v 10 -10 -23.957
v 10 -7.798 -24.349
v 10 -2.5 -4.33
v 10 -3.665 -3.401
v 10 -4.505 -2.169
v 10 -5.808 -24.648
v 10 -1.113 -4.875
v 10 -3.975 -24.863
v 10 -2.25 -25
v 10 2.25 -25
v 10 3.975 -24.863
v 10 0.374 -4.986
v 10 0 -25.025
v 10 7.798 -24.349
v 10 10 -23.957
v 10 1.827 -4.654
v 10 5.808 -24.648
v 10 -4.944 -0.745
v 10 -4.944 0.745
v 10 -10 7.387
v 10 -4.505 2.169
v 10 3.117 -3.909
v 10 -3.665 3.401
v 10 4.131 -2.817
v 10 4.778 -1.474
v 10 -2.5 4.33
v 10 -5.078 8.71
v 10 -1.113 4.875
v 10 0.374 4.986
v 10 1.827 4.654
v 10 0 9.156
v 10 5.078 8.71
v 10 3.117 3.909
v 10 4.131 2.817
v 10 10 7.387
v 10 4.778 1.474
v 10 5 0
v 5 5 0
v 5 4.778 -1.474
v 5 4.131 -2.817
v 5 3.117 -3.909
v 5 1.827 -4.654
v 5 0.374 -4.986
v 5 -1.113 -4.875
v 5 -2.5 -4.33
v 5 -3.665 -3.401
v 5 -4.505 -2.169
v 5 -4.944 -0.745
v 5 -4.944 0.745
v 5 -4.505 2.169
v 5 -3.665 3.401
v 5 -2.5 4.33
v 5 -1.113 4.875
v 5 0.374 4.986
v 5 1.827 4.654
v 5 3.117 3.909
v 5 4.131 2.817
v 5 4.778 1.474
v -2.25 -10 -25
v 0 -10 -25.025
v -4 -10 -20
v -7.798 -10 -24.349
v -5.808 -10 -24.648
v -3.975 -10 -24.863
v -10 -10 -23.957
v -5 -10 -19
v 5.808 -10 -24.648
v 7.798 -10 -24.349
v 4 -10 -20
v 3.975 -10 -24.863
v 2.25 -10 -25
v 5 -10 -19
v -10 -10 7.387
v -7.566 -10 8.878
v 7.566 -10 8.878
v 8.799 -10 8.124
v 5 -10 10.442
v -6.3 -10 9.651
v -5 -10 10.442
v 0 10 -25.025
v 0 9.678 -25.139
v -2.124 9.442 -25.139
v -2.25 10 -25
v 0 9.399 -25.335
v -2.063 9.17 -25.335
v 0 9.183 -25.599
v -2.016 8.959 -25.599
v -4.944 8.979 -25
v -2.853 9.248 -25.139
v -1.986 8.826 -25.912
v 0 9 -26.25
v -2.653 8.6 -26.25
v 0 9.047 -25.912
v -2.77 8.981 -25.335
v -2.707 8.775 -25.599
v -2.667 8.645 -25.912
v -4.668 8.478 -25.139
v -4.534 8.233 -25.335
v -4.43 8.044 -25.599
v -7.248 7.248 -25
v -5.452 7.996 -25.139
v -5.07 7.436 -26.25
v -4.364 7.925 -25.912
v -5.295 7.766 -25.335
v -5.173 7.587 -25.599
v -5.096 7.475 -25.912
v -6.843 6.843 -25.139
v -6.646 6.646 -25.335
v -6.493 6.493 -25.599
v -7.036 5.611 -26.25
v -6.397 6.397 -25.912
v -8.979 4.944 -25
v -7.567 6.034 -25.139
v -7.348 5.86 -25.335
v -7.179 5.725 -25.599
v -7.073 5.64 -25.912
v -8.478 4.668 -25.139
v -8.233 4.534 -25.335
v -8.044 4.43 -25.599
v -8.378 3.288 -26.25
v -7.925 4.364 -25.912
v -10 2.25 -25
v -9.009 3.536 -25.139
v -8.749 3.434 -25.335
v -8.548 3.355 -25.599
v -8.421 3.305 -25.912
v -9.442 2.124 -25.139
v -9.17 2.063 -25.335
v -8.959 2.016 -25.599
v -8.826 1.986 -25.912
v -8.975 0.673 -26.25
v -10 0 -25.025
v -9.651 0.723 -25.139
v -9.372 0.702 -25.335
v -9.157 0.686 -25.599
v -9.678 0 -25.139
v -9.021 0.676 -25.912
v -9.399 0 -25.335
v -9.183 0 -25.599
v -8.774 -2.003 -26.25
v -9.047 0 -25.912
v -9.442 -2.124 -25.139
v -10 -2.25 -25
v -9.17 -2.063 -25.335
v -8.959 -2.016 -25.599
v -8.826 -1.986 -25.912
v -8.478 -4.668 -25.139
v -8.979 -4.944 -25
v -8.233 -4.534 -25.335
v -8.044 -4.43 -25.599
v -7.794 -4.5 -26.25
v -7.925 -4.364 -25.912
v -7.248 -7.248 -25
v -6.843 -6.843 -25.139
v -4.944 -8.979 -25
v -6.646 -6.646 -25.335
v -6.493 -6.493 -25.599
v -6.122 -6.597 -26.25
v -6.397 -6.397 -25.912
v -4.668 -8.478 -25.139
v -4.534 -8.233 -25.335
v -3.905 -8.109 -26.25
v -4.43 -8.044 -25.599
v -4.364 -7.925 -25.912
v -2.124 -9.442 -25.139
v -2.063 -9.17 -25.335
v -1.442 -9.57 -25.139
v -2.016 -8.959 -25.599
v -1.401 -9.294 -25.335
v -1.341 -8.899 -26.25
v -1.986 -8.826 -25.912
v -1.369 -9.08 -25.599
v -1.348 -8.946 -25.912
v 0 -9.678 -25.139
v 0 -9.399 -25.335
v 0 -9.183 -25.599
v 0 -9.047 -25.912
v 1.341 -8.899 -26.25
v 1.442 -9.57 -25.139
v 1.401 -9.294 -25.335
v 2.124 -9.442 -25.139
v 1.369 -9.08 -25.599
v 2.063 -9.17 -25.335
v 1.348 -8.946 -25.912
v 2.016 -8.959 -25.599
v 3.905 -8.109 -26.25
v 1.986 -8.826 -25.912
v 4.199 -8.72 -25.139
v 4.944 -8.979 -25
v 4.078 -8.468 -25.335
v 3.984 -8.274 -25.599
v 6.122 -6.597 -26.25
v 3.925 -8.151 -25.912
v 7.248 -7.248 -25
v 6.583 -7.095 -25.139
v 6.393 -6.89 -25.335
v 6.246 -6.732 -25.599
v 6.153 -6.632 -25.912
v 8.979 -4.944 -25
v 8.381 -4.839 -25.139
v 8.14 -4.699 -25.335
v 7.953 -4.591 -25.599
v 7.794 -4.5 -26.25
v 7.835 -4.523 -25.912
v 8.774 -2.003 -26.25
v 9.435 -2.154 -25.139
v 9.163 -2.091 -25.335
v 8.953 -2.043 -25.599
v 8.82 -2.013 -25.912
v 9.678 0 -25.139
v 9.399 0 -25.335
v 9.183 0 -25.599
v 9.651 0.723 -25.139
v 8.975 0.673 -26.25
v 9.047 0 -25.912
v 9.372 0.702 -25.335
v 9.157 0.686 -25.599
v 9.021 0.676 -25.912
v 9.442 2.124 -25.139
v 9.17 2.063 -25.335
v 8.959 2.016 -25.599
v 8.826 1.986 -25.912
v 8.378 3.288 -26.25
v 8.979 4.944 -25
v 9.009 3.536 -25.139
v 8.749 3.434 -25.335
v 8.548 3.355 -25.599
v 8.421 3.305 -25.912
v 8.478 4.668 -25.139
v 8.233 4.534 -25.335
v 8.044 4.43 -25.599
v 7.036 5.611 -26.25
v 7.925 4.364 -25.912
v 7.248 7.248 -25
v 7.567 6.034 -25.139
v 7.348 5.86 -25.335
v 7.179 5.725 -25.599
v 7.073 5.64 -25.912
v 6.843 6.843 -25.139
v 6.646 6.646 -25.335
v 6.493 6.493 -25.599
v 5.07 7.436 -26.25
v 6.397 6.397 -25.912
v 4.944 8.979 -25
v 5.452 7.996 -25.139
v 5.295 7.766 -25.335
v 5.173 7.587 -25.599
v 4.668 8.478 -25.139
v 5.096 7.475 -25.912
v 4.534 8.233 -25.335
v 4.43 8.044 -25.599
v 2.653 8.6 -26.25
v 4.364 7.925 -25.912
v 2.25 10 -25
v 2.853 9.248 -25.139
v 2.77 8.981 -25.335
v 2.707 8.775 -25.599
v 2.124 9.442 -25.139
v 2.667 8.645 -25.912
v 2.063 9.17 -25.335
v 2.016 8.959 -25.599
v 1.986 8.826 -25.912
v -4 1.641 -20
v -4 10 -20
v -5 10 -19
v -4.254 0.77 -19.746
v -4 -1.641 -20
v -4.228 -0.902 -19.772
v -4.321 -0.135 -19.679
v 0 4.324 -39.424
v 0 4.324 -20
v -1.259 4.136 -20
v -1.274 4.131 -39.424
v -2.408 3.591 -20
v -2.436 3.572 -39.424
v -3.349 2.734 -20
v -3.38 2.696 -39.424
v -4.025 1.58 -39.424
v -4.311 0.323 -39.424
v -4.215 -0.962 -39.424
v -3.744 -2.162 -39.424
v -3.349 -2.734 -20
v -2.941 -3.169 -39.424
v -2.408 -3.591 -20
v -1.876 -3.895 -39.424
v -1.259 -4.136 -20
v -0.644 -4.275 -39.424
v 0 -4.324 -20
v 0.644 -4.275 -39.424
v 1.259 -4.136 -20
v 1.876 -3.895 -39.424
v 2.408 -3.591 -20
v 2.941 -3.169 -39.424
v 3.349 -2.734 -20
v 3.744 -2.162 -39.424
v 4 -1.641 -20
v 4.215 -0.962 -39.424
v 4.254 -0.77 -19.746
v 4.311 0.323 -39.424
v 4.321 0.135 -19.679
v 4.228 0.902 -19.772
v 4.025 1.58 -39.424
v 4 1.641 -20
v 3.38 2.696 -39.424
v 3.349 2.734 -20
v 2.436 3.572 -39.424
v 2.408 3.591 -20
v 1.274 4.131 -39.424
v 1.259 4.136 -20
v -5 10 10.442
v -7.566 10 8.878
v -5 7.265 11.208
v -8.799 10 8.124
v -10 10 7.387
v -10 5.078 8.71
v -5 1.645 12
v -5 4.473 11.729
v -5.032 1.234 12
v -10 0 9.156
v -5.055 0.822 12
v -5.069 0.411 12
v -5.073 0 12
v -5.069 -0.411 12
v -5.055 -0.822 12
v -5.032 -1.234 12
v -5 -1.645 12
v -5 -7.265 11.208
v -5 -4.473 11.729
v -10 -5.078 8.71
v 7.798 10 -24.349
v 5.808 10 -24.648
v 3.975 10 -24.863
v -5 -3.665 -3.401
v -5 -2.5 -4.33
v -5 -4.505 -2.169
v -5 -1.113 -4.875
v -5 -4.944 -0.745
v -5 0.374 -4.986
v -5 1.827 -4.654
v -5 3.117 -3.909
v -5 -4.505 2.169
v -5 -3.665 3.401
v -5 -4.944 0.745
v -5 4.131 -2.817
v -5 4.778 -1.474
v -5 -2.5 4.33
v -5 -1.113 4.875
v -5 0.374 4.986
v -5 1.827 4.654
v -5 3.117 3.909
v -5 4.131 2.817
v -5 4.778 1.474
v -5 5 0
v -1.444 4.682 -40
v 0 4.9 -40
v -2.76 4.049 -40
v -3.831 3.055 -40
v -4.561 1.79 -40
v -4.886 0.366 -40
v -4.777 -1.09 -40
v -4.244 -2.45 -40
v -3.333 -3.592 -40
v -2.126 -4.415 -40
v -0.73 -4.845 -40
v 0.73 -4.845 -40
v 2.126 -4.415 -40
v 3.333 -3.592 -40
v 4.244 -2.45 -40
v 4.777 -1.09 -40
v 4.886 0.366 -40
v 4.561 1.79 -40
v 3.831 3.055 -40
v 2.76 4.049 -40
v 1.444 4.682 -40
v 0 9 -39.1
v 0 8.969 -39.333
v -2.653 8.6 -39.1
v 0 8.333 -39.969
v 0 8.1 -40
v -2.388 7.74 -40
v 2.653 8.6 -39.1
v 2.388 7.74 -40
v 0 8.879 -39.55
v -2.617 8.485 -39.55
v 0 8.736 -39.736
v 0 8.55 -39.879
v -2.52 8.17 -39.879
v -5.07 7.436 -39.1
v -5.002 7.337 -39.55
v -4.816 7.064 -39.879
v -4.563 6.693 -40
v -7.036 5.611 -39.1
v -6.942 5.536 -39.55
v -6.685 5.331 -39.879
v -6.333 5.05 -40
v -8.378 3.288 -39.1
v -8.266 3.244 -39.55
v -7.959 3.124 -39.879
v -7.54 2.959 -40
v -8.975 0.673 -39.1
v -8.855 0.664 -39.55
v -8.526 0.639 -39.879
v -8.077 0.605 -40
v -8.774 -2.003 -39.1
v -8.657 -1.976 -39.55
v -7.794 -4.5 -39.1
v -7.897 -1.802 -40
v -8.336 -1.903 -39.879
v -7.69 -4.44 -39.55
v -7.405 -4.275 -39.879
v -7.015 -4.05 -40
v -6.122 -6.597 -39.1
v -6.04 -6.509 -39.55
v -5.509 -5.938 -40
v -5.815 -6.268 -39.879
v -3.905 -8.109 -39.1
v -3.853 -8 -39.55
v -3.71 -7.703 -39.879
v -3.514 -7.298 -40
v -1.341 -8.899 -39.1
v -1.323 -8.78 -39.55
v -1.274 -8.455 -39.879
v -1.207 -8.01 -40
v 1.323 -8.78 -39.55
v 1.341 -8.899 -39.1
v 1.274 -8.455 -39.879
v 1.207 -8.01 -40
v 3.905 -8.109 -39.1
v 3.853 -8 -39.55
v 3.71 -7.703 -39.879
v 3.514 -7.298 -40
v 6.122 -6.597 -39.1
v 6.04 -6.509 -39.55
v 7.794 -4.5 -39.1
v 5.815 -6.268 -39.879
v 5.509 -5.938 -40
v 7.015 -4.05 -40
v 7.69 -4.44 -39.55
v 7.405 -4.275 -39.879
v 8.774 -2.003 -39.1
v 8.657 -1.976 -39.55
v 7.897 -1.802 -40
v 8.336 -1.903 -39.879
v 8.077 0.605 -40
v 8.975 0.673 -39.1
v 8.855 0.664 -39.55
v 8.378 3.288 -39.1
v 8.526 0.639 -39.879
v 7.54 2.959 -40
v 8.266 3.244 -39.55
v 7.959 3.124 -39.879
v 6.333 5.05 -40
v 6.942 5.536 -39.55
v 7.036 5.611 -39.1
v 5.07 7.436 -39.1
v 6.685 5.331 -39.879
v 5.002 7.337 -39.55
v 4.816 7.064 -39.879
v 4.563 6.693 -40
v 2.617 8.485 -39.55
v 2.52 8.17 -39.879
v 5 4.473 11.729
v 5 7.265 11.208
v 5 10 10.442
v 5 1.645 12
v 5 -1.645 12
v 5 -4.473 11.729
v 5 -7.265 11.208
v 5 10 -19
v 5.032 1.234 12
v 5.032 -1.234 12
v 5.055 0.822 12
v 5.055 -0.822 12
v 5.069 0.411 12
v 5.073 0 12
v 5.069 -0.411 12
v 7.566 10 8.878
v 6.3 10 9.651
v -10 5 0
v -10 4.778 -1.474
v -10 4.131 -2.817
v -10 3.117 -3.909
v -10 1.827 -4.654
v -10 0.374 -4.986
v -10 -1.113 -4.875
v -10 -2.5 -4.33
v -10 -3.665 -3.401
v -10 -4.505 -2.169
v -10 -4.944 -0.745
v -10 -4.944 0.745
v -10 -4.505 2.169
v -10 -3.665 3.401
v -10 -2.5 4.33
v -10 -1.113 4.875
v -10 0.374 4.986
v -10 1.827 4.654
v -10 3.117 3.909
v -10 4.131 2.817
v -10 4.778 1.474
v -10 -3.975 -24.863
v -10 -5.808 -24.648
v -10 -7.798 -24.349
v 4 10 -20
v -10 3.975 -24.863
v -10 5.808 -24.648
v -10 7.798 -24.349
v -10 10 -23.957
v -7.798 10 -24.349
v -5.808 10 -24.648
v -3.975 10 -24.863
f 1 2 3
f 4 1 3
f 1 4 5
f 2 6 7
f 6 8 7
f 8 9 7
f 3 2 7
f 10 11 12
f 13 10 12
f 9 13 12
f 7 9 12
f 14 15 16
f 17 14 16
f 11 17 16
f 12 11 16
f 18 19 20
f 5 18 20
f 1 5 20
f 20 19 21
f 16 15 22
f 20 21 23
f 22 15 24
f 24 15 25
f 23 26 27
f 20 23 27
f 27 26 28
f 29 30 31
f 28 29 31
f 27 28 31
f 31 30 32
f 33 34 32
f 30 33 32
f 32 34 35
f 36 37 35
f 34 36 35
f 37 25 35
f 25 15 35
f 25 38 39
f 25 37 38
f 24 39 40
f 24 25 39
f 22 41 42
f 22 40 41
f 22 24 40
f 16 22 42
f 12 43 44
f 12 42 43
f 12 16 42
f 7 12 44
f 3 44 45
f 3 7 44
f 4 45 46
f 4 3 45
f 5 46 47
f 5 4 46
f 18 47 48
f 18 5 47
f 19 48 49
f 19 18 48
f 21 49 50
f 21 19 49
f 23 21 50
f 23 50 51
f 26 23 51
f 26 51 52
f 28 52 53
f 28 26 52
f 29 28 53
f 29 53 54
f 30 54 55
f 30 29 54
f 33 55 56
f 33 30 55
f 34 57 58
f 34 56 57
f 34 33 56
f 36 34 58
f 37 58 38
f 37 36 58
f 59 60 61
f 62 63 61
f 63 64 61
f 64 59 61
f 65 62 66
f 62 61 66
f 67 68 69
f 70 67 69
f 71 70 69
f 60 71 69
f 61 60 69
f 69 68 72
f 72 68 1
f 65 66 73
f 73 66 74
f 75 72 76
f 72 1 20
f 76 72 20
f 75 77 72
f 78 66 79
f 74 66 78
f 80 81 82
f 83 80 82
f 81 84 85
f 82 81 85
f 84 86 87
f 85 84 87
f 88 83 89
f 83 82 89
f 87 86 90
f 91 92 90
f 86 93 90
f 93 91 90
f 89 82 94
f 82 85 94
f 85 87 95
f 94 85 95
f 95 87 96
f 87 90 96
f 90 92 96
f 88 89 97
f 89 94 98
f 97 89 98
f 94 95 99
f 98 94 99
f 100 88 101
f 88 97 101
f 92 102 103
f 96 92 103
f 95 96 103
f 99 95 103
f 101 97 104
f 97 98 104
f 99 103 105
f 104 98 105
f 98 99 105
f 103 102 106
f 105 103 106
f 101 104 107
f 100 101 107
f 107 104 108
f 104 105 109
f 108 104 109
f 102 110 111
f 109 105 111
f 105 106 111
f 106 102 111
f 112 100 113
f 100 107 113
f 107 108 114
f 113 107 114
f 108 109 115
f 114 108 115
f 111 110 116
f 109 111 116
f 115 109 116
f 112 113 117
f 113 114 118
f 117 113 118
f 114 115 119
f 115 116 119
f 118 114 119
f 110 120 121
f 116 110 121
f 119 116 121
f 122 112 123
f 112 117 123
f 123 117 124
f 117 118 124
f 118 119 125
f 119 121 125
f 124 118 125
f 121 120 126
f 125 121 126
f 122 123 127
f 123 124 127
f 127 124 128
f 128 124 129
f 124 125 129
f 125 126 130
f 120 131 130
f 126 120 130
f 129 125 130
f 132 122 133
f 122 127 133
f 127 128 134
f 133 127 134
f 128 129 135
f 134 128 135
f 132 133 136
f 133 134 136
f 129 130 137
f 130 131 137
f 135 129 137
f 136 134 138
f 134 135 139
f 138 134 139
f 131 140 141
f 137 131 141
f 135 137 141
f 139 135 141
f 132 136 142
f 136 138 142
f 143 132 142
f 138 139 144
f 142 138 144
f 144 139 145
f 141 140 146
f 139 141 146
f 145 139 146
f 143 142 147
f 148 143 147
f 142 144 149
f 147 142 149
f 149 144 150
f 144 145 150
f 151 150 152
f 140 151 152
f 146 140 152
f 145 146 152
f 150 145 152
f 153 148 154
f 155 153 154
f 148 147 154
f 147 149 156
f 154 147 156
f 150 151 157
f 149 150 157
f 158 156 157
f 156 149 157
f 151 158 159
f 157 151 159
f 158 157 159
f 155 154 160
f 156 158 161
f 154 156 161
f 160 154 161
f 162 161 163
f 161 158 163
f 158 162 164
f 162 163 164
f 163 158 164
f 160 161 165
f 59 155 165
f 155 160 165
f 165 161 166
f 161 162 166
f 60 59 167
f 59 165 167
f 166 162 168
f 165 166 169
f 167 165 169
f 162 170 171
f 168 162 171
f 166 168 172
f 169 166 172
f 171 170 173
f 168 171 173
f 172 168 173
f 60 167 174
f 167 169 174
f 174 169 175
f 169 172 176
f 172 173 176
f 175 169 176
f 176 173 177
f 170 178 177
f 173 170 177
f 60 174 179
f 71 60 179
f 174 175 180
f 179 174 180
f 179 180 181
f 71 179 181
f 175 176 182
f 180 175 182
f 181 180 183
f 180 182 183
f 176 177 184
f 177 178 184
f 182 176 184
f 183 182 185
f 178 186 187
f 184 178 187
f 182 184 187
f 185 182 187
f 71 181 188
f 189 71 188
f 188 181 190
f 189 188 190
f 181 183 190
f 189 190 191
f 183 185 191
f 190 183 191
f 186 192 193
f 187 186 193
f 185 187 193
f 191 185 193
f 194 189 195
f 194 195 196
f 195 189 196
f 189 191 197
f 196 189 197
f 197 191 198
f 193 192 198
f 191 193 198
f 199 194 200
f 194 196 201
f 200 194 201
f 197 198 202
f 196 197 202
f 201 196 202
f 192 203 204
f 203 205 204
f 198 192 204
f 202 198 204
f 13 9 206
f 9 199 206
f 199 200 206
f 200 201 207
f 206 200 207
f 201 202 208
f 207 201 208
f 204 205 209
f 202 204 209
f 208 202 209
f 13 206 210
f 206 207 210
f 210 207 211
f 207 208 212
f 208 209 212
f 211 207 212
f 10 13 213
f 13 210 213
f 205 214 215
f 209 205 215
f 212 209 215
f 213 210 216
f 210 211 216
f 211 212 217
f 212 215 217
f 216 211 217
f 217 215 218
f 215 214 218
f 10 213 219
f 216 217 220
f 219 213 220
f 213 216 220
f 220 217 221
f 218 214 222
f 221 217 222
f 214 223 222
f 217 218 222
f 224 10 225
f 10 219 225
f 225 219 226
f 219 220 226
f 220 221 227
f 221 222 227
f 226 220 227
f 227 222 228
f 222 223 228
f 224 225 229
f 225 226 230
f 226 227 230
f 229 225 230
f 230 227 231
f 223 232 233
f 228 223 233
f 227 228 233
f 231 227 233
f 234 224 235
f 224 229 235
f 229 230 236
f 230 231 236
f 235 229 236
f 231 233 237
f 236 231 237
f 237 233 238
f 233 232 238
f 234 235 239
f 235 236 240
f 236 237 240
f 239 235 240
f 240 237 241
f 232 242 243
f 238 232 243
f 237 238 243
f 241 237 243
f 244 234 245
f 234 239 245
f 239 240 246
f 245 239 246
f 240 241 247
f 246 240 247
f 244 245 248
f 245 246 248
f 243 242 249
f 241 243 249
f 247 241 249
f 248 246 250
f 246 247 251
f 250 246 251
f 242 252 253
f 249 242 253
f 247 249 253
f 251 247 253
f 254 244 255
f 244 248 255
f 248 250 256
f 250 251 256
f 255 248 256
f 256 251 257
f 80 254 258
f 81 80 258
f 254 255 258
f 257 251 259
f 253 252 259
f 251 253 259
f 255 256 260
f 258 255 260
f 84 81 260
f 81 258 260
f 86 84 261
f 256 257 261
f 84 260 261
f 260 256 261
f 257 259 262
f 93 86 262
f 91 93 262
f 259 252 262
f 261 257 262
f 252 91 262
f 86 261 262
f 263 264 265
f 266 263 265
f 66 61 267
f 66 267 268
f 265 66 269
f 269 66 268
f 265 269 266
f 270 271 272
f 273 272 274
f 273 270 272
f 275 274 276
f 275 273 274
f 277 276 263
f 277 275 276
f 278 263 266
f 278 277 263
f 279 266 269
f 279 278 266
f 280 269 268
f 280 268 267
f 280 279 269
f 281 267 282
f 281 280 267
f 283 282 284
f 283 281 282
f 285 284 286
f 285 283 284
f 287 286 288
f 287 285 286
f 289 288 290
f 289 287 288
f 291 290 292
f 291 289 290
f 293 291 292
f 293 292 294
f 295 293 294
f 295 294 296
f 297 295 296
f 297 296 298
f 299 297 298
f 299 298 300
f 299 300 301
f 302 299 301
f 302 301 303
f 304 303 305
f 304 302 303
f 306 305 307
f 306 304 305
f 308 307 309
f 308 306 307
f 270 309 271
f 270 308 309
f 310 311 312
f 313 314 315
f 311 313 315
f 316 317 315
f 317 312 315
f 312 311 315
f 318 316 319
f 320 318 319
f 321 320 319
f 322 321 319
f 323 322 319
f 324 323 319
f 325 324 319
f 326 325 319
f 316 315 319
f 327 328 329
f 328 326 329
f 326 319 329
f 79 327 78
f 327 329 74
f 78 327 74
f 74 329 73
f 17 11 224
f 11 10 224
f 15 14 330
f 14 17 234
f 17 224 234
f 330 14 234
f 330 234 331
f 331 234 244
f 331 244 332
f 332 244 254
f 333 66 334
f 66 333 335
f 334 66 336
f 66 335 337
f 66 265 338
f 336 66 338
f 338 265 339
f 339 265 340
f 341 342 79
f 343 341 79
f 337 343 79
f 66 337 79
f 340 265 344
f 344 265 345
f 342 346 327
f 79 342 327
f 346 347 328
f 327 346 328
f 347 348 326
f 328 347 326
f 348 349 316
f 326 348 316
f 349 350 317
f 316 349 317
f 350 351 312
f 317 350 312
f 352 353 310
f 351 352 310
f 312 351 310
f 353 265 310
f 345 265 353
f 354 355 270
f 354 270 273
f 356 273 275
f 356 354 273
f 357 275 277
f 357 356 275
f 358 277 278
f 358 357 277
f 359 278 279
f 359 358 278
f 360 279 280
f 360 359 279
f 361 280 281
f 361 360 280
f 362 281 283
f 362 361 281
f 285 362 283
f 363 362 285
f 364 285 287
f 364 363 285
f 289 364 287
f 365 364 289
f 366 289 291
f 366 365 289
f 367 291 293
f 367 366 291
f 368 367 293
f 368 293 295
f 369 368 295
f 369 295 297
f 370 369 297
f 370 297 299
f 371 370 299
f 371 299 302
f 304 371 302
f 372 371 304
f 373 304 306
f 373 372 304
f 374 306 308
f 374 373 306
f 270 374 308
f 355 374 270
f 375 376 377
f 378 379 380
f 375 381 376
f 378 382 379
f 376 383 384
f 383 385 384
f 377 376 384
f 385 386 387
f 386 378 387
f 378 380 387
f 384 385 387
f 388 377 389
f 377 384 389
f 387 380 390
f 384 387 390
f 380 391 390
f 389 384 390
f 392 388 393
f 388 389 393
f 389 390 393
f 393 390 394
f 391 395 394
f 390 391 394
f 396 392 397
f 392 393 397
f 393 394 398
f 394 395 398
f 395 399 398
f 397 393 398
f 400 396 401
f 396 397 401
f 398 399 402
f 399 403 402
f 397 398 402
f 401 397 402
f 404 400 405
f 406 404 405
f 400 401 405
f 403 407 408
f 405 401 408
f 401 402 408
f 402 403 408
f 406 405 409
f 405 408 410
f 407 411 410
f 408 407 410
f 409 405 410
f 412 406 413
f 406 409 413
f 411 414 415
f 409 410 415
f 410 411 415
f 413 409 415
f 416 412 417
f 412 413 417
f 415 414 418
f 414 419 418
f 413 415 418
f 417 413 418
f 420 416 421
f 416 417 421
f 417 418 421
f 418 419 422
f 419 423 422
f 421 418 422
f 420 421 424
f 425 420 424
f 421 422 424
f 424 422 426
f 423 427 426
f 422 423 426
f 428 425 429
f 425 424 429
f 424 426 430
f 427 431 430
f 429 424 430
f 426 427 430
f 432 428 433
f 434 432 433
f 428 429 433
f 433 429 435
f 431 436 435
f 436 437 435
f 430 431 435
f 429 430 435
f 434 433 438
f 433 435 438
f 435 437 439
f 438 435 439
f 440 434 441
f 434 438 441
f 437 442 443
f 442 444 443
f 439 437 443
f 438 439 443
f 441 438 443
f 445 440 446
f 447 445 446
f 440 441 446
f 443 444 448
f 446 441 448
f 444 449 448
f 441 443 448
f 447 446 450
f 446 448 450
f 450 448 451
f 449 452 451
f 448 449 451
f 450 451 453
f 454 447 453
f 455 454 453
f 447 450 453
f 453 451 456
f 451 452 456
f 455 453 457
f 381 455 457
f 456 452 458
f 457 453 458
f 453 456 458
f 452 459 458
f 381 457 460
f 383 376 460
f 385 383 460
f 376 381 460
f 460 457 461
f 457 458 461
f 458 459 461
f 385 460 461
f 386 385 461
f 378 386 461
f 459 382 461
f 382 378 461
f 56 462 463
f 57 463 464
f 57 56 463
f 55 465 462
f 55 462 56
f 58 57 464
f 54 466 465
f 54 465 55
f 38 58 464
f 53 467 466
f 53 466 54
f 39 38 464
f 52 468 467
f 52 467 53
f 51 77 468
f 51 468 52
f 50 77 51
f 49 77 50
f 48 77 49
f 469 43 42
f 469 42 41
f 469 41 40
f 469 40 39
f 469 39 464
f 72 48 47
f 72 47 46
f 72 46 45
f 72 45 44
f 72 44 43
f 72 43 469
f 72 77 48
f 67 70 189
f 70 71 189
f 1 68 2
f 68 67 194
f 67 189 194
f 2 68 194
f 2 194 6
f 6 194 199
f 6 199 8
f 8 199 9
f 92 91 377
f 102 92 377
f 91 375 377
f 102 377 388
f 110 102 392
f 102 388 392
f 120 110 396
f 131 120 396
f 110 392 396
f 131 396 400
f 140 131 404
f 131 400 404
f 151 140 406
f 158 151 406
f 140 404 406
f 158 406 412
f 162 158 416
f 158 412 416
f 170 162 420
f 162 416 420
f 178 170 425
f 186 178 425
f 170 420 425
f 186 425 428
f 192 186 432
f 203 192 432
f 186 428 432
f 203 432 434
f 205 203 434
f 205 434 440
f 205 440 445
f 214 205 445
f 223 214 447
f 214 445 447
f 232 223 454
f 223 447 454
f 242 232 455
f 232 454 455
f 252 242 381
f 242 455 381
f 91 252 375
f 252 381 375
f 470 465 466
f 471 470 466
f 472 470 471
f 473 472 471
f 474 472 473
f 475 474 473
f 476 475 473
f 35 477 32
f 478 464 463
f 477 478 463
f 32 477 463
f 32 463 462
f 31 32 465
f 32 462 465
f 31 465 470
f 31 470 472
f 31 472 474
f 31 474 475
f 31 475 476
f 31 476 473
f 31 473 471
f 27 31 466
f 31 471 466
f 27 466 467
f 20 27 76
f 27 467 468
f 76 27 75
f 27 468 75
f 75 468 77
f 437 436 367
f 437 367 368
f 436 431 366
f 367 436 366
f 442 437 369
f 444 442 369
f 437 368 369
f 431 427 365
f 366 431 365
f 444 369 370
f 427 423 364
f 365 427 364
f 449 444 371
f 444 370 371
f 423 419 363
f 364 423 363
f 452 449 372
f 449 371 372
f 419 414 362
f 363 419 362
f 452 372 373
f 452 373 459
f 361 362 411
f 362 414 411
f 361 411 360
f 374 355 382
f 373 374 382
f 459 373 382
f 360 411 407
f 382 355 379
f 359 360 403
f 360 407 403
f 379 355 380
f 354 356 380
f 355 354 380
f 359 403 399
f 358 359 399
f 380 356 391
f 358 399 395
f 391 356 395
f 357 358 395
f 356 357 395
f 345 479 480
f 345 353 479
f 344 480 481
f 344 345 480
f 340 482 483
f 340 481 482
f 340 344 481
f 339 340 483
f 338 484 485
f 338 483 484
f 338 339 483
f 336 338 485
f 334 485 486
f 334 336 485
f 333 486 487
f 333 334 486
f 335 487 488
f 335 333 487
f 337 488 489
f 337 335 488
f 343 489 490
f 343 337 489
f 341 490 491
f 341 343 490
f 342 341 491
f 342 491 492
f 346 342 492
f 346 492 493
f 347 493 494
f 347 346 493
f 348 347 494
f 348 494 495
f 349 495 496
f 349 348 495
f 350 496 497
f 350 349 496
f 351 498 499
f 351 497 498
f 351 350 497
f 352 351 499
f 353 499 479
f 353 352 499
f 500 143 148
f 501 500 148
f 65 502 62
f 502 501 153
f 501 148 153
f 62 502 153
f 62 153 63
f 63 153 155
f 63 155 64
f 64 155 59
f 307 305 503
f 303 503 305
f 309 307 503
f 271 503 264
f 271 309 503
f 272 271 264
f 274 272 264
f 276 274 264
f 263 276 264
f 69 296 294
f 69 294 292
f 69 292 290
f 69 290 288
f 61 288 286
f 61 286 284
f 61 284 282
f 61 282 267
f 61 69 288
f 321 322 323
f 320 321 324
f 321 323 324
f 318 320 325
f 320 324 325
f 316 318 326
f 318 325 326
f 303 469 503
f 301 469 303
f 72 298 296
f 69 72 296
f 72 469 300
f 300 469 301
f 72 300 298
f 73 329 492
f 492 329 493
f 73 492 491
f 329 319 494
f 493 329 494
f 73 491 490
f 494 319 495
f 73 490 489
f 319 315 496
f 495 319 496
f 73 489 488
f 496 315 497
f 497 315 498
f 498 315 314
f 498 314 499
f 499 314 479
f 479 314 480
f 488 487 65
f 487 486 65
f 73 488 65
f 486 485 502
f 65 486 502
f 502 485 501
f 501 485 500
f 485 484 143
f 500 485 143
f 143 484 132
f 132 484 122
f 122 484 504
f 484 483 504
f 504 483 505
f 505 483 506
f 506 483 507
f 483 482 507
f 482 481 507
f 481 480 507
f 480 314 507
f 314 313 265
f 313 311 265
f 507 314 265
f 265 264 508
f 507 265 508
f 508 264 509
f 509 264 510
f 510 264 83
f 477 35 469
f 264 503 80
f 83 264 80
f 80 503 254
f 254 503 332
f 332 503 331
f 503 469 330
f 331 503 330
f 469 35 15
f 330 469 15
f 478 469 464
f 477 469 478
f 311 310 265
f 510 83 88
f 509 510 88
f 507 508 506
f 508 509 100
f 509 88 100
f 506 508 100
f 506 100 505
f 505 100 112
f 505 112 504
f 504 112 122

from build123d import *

# Parameters (mm, degrees)
CUT_EXTRUDE1_DEPTH           = 21
CUT_EXTRUDE1_DEPTH_BACK      = 21
CUT_EXTRUDE2_DEPTH           = 21
CUT_EXTRUDE2_DEPTH_BACK      = 21
CUT_EXTRUDE3_DEPTH           = 21
CUT_EXTRUDE3_DEPTH_BACK      = 21
SKETCH5_W                    = 26
SKETCH5_H                    = 5
CUT_REVOLVE3_ANGLE           = 90
CUT_REVOLVE3_OTHER_WAY_ANGLE = 90


with BuildPart() as part:
    # Sketch1 → Revolve1 (revolve)
    with BuildSketch(Plane(origin=(0, 0, 0), x_dir=(0, 0, -1), z_dir=(1, 0, 0))):
        with BuildLine():
            Line((-12, 0), (-12, 20))
            Line((-12, 20), (22.387495374, 20))
            Line((22.387495374, 20), (25, 10.25))
            ThreePointArc((25, 10.25), (25.366116524, 9.366116524), (26.25, 9))
            Line((26.25, 9), (39.1, 9))
            ThreePointArc((39.1, 9), (39.736396103, 8.736396103), (40, 8.1))
            Line((40, 8.1), (40, 0))
            Line((40, 0), (-12, 0))
        make_face()
    revolve(axis=Axis((0, 0, -40), (0, 0, 1)))

    # Sketch2 → Cut-Extrude1 (cut, two sides: drawn at the far end of the back side and taken through both)
    with BuildSketch(Plane(origin=(0, 0, 0), x_dir=(1, 0, 0), z_dir=(0, 1, 0)).offset(-CUT_EXTRUDE1_DEPTH_BACK)):
        Polygon((-5, 19), (-5, -13), (5, -13), (5, 19), (4, 20), (-4, 20), align=None)
    extrude(amount=CUT_EXTRUDE1_DEPTH + CUT_EXTRUDE1_DEPTH_BACK, mode=Mode.SUBTRACT)

    # Sketch3 → Cut-Extrude2 (cut, two sides: drawn at the far end of the back side and taken through both)
    with BuildSketch(Plane(origin=(0, 0, 0), x_dir=(0, 0, -1), z_dir=(1, 0, 0)).offset(-CUT_EXTRUDE2_DEPTH_BACK)):
        Polygon((-33, -30), (40, -30), (40, -10), (-13, -10), (-13, 10), (40, 10), (40, 30), (-33, 30), align=None)
    extrude(amount=CUT_EXTRUDE2_DEPTH + CUT_EXTRUDE2_DEPTH_BACK, mode=Mode.SUBTRACT)

    # Sketch4 → Cut-Extrude3 (cut, two sides: drawn at the far end of the back side and taken through both)
    with BuildSketch(Plane(origin=(0, 0, 0), x_dir=(1, 0, 0), z_dir=(0, 1, 0)).offset(-CUT_EXTRUDE3_DEPTH_BACK)):
        Polygon((-30, -33), (30, -33), (30, 40), (10, 40), (10, -13), (-10, -13), (-10, 40), (-30, 40), align=None)
    extrude(amount=CUT_EXTRUDE3_DEPTH + CUT_EXTRUDE3_DEPTH_BACK, mode=Mode.SUBTRACT)

    # Sketch5 → Cut-Revolve1 (revolve, cut)
    with BuildSketch(Plane.XY):
        with Locations((0, 2.5)):
            Rectangle(SKETCH5_W, SKETCH5_H)
    revolve(axis=Axis((13, 0, 0), (-1, 0, 0)), mode=Mode.SUBTRACT)

    # Sketch6 → Cut-Revolve2 (revolve, cut)
    with BuildSketch(Plane(origin=(0, 0, 0), x_dir=(0, 0, -1), z_dir=(1, 0, 0))):
        Polygon((18.9, 0), (18.9, 4.3235), (39.4235, 4.3235), (40.1, 5), (40.1, 0), align=None)
    revolve(axis=Axis((0, 0, -40.1), (0, 0, 1)), mode=Mode.SUBTRACT)

    # Sketch7 → Cut-Revolve3 (revolve, cut)
    with BuildSketch(Plane(origin=(0, 0, 0), x_dir=(1, 0, 0), z_dir=(0, 1, 0))):
        Polygon((-12, -8.000813089), (-12, -31.094823856), (0, -38.023027087), (12, -31.094823856), (12, -8.000813089), (0, -14.929016319), align=None)
    revolve(axis=Axis((-12, 0, -20), (-1, 0, 0)), revolution_arc=CUT_REVOLVE3_ANGLE, mode=Mode.SUBTRACT)

    # Sketch7 → Cut-Revolve3 other way (revolve, cut)
    with BuildSketch(Plane(origin=(0, 0, 0), x_dir=(1, 0, 0), z_dir=(0, 1, 0))):
        Polygon((-12, -8.000813089), (-12, -31.094823856), (0, -38.023027087), (12, -31.094823856), (12, -8.000813089), (0, -14.929016319), align=None)
    revolve(axis=Axis((-12, 0, -20), (1, 0, 0)), revolution_arc=CUT_REVOLVE3_OTHER_WAY_ANGLE, mode=Mode.SUBTRACT)


solid = part.part
